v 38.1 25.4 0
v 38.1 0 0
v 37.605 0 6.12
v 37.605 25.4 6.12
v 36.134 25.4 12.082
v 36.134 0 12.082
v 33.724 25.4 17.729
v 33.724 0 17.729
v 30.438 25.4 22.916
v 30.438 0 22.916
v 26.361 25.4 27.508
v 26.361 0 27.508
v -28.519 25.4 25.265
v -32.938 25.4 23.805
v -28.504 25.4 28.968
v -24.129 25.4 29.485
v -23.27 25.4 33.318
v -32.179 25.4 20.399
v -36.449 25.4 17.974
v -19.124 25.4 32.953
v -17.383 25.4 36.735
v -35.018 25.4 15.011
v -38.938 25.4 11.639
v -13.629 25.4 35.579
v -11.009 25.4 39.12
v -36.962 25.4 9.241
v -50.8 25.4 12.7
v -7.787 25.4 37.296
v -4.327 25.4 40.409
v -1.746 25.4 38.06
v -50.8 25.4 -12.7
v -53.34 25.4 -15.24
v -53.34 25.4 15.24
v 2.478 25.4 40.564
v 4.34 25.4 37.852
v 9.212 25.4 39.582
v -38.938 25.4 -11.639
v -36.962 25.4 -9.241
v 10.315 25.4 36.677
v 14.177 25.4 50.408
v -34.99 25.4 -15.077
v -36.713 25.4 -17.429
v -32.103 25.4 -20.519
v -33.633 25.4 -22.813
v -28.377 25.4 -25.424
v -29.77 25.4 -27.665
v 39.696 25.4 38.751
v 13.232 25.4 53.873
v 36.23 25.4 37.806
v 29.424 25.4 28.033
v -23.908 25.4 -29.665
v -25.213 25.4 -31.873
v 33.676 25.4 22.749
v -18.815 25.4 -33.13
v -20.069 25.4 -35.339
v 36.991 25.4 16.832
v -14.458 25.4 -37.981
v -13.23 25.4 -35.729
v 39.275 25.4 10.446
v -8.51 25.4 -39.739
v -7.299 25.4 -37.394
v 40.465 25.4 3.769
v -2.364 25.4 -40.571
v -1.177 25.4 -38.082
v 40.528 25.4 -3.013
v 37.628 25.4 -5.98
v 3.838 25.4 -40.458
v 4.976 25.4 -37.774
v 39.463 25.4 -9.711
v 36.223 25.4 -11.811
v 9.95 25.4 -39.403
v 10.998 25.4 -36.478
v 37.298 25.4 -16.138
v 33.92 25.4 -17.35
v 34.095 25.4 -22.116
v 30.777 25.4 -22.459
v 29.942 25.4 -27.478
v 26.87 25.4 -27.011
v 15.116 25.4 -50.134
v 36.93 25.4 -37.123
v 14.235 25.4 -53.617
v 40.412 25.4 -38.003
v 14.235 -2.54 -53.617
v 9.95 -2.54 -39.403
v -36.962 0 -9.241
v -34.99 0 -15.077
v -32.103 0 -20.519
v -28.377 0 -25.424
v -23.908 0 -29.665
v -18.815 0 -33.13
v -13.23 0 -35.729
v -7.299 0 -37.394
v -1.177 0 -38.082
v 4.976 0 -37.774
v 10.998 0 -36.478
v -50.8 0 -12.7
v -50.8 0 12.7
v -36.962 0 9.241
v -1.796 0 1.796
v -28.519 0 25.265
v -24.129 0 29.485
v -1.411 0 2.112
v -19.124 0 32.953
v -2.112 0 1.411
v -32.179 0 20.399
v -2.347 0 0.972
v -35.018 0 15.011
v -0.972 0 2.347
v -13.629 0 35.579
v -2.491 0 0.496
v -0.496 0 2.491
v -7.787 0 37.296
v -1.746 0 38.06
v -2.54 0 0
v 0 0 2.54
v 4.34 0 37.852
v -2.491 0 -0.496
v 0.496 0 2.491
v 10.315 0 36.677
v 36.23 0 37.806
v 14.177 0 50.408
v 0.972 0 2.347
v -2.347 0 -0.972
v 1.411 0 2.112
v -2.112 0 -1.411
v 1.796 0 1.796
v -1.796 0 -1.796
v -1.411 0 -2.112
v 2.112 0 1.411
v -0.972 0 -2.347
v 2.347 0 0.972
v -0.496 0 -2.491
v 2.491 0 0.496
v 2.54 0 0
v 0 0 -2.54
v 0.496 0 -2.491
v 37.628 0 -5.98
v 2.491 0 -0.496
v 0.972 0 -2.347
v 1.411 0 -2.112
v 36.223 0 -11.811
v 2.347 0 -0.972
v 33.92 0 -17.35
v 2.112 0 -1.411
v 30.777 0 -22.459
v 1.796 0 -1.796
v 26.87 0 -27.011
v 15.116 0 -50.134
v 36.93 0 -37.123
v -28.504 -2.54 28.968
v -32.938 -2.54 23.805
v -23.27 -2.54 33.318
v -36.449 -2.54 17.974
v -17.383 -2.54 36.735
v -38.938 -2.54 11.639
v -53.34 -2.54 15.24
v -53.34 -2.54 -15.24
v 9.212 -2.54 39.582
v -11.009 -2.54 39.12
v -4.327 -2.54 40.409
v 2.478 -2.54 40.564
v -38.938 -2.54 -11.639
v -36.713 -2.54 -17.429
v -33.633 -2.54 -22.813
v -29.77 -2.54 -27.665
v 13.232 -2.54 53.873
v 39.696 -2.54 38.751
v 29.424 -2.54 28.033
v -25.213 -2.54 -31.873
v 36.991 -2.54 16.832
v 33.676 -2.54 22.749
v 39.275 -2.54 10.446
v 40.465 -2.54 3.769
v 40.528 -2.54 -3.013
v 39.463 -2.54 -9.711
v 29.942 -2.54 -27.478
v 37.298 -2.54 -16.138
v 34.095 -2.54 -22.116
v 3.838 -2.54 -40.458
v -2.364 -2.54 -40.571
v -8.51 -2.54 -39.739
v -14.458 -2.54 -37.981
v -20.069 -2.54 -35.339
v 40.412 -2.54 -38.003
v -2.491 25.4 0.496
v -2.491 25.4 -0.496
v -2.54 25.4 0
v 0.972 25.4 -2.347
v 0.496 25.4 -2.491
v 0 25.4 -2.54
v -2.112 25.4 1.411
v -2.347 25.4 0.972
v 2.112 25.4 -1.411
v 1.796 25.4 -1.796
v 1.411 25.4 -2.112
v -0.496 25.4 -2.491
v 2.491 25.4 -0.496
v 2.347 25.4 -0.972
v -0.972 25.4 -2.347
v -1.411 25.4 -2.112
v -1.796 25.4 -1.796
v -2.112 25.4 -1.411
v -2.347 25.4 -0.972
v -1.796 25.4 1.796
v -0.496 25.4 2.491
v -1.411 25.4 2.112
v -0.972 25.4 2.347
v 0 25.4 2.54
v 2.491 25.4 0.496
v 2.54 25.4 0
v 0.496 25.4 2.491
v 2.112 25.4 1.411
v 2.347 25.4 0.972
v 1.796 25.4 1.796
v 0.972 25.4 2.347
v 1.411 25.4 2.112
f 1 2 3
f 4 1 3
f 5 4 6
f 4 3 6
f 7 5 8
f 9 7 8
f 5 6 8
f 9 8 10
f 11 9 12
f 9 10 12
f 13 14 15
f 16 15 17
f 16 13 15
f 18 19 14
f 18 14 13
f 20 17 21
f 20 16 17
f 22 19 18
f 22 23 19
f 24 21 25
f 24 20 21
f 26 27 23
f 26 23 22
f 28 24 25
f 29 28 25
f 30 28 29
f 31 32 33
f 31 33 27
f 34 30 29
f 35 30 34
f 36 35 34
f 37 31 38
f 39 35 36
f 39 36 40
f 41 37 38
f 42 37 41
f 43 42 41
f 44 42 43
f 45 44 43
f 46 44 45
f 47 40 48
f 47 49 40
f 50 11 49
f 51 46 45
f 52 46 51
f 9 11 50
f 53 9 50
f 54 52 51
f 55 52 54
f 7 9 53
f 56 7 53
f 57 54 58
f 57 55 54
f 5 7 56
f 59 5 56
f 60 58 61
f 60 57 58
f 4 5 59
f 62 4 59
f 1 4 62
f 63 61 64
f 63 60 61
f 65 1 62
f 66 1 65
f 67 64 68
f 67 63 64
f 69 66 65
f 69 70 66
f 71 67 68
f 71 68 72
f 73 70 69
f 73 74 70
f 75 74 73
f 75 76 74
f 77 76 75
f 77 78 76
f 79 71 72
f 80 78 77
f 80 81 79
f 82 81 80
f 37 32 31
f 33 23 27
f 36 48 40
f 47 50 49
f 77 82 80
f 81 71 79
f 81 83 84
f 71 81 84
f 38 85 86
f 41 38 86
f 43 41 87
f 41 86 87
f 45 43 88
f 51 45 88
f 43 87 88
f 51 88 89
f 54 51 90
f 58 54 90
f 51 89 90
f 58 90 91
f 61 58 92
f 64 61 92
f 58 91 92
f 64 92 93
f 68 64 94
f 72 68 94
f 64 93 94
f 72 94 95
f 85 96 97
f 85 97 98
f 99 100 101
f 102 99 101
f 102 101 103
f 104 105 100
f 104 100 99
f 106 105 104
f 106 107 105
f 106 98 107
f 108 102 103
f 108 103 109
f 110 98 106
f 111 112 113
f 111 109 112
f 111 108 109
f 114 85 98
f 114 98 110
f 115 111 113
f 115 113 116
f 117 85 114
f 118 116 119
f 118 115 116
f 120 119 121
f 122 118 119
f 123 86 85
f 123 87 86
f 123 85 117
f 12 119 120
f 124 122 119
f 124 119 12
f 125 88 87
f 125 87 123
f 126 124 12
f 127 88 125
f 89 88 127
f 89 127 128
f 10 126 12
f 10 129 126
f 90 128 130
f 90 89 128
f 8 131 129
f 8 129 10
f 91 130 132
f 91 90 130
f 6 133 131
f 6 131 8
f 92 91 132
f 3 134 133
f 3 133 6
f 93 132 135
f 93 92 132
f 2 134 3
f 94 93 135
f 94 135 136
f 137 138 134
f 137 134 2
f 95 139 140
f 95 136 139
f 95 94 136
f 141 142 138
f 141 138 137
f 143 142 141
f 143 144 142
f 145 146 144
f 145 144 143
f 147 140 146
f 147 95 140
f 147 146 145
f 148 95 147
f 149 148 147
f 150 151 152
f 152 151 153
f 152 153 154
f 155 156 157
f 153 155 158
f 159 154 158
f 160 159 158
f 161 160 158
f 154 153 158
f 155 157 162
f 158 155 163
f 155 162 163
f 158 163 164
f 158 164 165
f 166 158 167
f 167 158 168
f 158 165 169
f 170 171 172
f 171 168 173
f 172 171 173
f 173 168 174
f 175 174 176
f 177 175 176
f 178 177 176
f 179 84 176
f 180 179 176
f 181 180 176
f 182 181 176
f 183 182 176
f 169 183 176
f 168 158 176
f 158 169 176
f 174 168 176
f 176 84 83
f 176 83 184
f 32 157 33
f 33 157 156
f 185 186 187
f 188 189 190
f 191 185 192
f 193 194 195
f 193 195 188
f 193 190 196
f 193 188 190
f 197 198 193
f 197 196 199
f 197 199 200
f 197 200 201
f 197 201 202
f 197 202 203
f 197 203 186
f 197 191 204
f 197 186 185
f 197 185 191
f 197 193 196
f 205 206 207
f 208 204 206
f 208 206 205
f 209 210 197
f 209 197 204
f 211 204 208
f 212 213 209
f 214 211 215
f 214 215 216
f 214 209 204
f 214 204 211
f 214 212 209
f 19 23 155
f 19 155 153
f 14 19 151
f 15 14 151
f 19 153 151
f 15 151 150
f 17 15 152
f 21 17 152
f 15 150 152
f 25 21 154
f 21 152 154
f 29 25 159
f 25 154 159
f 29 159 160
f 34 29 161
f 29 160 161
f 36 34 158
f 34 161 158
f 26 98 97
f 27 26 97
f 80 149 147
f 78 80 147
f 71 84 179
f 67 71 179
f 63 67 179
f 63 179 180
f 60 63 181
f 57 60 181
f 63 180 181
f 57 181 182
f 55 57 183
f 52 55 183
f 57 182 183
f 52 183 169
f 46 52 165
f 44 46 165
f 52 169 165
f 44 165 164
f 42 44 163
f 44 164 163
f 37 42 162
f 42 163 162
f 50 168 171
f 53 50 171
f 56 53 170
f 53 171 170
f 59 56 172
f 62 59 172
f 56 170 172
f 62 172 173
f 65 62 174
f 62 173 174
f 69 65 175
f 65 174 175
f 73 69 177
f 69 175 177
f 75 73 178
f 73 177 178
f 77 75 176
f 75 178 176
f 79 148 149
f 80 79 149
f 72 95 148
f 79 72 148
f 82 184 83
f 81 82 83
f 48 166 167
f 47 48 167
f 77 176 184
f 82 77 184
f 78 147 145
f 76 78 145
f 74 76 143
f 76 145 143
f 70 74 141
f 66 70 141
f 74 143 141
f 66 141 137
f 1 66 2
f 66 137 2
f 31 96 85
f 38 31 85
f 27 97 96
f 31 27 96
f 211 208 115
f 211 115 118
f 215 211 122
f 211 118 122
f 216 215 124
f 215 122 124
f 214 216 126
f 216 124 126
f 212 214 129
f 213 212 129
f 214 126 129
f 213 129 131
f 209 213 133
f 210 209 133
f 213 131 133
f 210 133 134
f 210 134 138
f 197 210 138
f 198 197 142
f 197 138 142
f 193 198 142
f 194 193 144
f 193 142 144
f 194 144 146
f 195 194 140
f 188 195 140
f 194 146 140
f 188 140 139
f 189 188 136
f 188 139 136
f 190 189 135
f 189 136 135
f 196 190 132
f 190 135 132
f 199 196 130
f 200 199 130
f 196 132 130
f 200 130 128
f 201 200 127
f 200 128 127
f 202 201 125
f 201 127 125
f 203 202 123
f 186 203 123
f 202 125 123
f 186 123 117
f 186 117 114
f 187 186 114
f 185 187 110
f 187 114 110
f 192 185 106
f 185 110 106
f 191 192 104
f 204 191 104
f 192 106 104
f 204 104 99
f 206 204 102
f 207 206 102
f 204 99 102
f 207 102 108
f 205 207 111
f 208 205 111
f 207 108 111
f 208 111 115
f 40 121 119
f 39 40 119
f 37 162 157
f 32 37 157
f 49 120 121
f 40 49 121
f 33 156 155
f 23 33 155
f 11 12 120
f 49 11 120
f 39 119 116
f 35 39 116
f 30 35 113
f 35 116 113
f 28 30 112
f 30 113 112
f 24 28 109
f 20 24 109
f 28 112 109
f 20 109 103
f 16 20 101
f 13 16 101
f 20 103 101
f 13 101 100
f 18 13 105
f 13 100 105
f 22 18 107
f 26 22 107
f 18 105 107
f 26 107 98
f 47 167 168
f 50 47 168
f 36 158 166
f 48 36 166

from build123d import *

# Parameters (mm, degrees)
EXTRUDE_1_DEPTH = 25.4
EXTRUDE_START   = -2.54
EXTRUDE_3_DEPTH = 2.54
SKETCH_3_R      = 2.54
EXTRUDE_4_DEPTH = 25.4


with BuildPart() as part:
    # 草图2 → 凸台-拉伸1 (new body)
    with BuildSketch(Plane(origin=(0, 0, 0), x_dir=(1, 0, 0), z_dir=(0, 1, 0))):
        with BuildLine():
            Line((-38.937567428, 11.639391857), (-53.34, 15.24))
            Line((-53.34, 15.24), (-53.34, -15.24))
            Line((-53.34, -15.24), (-38.937567428, -11.639391857))
            ThreePointArc((-38.937567428, -11.639391857), (-20.39841157, -35.149884857), (9.2123832, -39.582086804))
            Line((9.2123832, -39.582086804), (13.231701545, -53.873326185))
            Line((13.231701545, -53.873326185), (39.695843447, -38.751170473))
            Line((39.695843447, -38.751170473), (29.424096964, -28.032697299))
            ThreePointArc((29.424096964, -28.032697299), (40.638229061, -0.379392686), (29.942341184, 27.478460736))
            Line((29.942341184, 27.478460736), (40.412412109, 38.003291273))
            Line((40.412412109, 38.003291273), (14.235214892, 53.616898987))
            Line((14.235214892, 53.616898987), (9.949778446, 39.403191608))
            ThreePointArc((9.949778446, 39.403191608), (-20.069382693, 35.338781506), (-38.937567428, 11.639391857))
        make_face()
        with BuildLine():
            Line((10.998151919, 36.478084576), (15.115514017, 50.134331909))
            Line((15.115514017, 50.134331909), (36.929845031, 37.122992148))
            Line((36.929845031, 37.122992148), (26.870409141, 27.010944311))
            ThreePointArc((26.870409141, 27.010944311), (35.180765969, 14.626130926), (38.1, 0))
            ThreePointArc((38.1, 0), (35.042691409, -14.953921854), (26.361428934, -27.507909127))
            Line((26.361428934, -27.507909127), (36.230318646, -37.806004957))
            Line((36.230318646, -37.806004957), (14.176867061, -50.407801384))
            Line((14.176867061, -50.407801384), (10.315185941, -36.677062846))
            ThreePointArc((10.315185941, -36.677062846), (-19.123510847, -32.953017053), (-36.962429256, -9.240607314))
            Line((-36.962429256, -9.240607314), (-50.8, -12.7))
            Line((-50.8, -12.7), (-50.8, 12.7))
            Line((-50.8, 12.7), (-36.962429256, 9.240607314))
            ThreePointArc((-36.962429256, 9.240607314), (-18.815046274, 33.130107662), (10.998151919, 36.478084576))
        make_face(mode=Mode.SUBTRACT)
    extrude(amount=EXTRUDE_1_DEPTH)

    # 草图2<4> → 凸台-拉伸3 (add)
    with BuildSketch(Plane(origin=(0, 0, 0), x_dir=(1, 0, 0), z_dir=(0, 1, 0)).offset(EXTRUDE_START)):
        with BuildLine():
            Line((-38.937567428, 11.639391857), (-53.34, 15.24))
            Line((-53.34, 15.24), (-53.34, -15.24))
            Line((-53.34, -15.24), (-38.937567428, -11.639391857))
            ThreePointArc((-38.937567428, -11.639391857), (-20.39841157, -35.149884857), (9.2123832, -39.582086804))
            Line((9.2123832, -39.582086804), (13.231701545, -53.873326185))
            Line((13.231701545, -53.873326185), (39.695843447, -38.751170473))
            Line((39.695843447, -38.751170473), (29.424096964, -28.032697299))
            ThreePointArc((29.424096964, -28.032697299), (40.638229061, -0.379392686), (29.942341184, 27.478460736))
            Line((29.942341184, 27.478460736), (40.412412109, 38.003291273))
            Line((40.412412109, 38.003291273), (14.235214892, 53.616898987))
            Line((14.235214892, 53.616898987), (9.949778446, 39.403191608))
            ThreePointArc((9.949778446, 39.403191608), (-20.069382693, 35.338781506), (-38.937567428, 11.639391857))
        make_face()
    extrude(amount=EXTRUDE_3_DEPTH)

    # 草图3 → 凸台-拉伸4 (add)
    with BuildSketch(Plane(origin=(0, 0, 0), x_dir=(1, 0, 0), z_dir=(0, 1, 0))):
        Circle(SKETCH_3_R)
    extrude(amount=EXTRUDE_4_DEPTH)


solid = part.part
